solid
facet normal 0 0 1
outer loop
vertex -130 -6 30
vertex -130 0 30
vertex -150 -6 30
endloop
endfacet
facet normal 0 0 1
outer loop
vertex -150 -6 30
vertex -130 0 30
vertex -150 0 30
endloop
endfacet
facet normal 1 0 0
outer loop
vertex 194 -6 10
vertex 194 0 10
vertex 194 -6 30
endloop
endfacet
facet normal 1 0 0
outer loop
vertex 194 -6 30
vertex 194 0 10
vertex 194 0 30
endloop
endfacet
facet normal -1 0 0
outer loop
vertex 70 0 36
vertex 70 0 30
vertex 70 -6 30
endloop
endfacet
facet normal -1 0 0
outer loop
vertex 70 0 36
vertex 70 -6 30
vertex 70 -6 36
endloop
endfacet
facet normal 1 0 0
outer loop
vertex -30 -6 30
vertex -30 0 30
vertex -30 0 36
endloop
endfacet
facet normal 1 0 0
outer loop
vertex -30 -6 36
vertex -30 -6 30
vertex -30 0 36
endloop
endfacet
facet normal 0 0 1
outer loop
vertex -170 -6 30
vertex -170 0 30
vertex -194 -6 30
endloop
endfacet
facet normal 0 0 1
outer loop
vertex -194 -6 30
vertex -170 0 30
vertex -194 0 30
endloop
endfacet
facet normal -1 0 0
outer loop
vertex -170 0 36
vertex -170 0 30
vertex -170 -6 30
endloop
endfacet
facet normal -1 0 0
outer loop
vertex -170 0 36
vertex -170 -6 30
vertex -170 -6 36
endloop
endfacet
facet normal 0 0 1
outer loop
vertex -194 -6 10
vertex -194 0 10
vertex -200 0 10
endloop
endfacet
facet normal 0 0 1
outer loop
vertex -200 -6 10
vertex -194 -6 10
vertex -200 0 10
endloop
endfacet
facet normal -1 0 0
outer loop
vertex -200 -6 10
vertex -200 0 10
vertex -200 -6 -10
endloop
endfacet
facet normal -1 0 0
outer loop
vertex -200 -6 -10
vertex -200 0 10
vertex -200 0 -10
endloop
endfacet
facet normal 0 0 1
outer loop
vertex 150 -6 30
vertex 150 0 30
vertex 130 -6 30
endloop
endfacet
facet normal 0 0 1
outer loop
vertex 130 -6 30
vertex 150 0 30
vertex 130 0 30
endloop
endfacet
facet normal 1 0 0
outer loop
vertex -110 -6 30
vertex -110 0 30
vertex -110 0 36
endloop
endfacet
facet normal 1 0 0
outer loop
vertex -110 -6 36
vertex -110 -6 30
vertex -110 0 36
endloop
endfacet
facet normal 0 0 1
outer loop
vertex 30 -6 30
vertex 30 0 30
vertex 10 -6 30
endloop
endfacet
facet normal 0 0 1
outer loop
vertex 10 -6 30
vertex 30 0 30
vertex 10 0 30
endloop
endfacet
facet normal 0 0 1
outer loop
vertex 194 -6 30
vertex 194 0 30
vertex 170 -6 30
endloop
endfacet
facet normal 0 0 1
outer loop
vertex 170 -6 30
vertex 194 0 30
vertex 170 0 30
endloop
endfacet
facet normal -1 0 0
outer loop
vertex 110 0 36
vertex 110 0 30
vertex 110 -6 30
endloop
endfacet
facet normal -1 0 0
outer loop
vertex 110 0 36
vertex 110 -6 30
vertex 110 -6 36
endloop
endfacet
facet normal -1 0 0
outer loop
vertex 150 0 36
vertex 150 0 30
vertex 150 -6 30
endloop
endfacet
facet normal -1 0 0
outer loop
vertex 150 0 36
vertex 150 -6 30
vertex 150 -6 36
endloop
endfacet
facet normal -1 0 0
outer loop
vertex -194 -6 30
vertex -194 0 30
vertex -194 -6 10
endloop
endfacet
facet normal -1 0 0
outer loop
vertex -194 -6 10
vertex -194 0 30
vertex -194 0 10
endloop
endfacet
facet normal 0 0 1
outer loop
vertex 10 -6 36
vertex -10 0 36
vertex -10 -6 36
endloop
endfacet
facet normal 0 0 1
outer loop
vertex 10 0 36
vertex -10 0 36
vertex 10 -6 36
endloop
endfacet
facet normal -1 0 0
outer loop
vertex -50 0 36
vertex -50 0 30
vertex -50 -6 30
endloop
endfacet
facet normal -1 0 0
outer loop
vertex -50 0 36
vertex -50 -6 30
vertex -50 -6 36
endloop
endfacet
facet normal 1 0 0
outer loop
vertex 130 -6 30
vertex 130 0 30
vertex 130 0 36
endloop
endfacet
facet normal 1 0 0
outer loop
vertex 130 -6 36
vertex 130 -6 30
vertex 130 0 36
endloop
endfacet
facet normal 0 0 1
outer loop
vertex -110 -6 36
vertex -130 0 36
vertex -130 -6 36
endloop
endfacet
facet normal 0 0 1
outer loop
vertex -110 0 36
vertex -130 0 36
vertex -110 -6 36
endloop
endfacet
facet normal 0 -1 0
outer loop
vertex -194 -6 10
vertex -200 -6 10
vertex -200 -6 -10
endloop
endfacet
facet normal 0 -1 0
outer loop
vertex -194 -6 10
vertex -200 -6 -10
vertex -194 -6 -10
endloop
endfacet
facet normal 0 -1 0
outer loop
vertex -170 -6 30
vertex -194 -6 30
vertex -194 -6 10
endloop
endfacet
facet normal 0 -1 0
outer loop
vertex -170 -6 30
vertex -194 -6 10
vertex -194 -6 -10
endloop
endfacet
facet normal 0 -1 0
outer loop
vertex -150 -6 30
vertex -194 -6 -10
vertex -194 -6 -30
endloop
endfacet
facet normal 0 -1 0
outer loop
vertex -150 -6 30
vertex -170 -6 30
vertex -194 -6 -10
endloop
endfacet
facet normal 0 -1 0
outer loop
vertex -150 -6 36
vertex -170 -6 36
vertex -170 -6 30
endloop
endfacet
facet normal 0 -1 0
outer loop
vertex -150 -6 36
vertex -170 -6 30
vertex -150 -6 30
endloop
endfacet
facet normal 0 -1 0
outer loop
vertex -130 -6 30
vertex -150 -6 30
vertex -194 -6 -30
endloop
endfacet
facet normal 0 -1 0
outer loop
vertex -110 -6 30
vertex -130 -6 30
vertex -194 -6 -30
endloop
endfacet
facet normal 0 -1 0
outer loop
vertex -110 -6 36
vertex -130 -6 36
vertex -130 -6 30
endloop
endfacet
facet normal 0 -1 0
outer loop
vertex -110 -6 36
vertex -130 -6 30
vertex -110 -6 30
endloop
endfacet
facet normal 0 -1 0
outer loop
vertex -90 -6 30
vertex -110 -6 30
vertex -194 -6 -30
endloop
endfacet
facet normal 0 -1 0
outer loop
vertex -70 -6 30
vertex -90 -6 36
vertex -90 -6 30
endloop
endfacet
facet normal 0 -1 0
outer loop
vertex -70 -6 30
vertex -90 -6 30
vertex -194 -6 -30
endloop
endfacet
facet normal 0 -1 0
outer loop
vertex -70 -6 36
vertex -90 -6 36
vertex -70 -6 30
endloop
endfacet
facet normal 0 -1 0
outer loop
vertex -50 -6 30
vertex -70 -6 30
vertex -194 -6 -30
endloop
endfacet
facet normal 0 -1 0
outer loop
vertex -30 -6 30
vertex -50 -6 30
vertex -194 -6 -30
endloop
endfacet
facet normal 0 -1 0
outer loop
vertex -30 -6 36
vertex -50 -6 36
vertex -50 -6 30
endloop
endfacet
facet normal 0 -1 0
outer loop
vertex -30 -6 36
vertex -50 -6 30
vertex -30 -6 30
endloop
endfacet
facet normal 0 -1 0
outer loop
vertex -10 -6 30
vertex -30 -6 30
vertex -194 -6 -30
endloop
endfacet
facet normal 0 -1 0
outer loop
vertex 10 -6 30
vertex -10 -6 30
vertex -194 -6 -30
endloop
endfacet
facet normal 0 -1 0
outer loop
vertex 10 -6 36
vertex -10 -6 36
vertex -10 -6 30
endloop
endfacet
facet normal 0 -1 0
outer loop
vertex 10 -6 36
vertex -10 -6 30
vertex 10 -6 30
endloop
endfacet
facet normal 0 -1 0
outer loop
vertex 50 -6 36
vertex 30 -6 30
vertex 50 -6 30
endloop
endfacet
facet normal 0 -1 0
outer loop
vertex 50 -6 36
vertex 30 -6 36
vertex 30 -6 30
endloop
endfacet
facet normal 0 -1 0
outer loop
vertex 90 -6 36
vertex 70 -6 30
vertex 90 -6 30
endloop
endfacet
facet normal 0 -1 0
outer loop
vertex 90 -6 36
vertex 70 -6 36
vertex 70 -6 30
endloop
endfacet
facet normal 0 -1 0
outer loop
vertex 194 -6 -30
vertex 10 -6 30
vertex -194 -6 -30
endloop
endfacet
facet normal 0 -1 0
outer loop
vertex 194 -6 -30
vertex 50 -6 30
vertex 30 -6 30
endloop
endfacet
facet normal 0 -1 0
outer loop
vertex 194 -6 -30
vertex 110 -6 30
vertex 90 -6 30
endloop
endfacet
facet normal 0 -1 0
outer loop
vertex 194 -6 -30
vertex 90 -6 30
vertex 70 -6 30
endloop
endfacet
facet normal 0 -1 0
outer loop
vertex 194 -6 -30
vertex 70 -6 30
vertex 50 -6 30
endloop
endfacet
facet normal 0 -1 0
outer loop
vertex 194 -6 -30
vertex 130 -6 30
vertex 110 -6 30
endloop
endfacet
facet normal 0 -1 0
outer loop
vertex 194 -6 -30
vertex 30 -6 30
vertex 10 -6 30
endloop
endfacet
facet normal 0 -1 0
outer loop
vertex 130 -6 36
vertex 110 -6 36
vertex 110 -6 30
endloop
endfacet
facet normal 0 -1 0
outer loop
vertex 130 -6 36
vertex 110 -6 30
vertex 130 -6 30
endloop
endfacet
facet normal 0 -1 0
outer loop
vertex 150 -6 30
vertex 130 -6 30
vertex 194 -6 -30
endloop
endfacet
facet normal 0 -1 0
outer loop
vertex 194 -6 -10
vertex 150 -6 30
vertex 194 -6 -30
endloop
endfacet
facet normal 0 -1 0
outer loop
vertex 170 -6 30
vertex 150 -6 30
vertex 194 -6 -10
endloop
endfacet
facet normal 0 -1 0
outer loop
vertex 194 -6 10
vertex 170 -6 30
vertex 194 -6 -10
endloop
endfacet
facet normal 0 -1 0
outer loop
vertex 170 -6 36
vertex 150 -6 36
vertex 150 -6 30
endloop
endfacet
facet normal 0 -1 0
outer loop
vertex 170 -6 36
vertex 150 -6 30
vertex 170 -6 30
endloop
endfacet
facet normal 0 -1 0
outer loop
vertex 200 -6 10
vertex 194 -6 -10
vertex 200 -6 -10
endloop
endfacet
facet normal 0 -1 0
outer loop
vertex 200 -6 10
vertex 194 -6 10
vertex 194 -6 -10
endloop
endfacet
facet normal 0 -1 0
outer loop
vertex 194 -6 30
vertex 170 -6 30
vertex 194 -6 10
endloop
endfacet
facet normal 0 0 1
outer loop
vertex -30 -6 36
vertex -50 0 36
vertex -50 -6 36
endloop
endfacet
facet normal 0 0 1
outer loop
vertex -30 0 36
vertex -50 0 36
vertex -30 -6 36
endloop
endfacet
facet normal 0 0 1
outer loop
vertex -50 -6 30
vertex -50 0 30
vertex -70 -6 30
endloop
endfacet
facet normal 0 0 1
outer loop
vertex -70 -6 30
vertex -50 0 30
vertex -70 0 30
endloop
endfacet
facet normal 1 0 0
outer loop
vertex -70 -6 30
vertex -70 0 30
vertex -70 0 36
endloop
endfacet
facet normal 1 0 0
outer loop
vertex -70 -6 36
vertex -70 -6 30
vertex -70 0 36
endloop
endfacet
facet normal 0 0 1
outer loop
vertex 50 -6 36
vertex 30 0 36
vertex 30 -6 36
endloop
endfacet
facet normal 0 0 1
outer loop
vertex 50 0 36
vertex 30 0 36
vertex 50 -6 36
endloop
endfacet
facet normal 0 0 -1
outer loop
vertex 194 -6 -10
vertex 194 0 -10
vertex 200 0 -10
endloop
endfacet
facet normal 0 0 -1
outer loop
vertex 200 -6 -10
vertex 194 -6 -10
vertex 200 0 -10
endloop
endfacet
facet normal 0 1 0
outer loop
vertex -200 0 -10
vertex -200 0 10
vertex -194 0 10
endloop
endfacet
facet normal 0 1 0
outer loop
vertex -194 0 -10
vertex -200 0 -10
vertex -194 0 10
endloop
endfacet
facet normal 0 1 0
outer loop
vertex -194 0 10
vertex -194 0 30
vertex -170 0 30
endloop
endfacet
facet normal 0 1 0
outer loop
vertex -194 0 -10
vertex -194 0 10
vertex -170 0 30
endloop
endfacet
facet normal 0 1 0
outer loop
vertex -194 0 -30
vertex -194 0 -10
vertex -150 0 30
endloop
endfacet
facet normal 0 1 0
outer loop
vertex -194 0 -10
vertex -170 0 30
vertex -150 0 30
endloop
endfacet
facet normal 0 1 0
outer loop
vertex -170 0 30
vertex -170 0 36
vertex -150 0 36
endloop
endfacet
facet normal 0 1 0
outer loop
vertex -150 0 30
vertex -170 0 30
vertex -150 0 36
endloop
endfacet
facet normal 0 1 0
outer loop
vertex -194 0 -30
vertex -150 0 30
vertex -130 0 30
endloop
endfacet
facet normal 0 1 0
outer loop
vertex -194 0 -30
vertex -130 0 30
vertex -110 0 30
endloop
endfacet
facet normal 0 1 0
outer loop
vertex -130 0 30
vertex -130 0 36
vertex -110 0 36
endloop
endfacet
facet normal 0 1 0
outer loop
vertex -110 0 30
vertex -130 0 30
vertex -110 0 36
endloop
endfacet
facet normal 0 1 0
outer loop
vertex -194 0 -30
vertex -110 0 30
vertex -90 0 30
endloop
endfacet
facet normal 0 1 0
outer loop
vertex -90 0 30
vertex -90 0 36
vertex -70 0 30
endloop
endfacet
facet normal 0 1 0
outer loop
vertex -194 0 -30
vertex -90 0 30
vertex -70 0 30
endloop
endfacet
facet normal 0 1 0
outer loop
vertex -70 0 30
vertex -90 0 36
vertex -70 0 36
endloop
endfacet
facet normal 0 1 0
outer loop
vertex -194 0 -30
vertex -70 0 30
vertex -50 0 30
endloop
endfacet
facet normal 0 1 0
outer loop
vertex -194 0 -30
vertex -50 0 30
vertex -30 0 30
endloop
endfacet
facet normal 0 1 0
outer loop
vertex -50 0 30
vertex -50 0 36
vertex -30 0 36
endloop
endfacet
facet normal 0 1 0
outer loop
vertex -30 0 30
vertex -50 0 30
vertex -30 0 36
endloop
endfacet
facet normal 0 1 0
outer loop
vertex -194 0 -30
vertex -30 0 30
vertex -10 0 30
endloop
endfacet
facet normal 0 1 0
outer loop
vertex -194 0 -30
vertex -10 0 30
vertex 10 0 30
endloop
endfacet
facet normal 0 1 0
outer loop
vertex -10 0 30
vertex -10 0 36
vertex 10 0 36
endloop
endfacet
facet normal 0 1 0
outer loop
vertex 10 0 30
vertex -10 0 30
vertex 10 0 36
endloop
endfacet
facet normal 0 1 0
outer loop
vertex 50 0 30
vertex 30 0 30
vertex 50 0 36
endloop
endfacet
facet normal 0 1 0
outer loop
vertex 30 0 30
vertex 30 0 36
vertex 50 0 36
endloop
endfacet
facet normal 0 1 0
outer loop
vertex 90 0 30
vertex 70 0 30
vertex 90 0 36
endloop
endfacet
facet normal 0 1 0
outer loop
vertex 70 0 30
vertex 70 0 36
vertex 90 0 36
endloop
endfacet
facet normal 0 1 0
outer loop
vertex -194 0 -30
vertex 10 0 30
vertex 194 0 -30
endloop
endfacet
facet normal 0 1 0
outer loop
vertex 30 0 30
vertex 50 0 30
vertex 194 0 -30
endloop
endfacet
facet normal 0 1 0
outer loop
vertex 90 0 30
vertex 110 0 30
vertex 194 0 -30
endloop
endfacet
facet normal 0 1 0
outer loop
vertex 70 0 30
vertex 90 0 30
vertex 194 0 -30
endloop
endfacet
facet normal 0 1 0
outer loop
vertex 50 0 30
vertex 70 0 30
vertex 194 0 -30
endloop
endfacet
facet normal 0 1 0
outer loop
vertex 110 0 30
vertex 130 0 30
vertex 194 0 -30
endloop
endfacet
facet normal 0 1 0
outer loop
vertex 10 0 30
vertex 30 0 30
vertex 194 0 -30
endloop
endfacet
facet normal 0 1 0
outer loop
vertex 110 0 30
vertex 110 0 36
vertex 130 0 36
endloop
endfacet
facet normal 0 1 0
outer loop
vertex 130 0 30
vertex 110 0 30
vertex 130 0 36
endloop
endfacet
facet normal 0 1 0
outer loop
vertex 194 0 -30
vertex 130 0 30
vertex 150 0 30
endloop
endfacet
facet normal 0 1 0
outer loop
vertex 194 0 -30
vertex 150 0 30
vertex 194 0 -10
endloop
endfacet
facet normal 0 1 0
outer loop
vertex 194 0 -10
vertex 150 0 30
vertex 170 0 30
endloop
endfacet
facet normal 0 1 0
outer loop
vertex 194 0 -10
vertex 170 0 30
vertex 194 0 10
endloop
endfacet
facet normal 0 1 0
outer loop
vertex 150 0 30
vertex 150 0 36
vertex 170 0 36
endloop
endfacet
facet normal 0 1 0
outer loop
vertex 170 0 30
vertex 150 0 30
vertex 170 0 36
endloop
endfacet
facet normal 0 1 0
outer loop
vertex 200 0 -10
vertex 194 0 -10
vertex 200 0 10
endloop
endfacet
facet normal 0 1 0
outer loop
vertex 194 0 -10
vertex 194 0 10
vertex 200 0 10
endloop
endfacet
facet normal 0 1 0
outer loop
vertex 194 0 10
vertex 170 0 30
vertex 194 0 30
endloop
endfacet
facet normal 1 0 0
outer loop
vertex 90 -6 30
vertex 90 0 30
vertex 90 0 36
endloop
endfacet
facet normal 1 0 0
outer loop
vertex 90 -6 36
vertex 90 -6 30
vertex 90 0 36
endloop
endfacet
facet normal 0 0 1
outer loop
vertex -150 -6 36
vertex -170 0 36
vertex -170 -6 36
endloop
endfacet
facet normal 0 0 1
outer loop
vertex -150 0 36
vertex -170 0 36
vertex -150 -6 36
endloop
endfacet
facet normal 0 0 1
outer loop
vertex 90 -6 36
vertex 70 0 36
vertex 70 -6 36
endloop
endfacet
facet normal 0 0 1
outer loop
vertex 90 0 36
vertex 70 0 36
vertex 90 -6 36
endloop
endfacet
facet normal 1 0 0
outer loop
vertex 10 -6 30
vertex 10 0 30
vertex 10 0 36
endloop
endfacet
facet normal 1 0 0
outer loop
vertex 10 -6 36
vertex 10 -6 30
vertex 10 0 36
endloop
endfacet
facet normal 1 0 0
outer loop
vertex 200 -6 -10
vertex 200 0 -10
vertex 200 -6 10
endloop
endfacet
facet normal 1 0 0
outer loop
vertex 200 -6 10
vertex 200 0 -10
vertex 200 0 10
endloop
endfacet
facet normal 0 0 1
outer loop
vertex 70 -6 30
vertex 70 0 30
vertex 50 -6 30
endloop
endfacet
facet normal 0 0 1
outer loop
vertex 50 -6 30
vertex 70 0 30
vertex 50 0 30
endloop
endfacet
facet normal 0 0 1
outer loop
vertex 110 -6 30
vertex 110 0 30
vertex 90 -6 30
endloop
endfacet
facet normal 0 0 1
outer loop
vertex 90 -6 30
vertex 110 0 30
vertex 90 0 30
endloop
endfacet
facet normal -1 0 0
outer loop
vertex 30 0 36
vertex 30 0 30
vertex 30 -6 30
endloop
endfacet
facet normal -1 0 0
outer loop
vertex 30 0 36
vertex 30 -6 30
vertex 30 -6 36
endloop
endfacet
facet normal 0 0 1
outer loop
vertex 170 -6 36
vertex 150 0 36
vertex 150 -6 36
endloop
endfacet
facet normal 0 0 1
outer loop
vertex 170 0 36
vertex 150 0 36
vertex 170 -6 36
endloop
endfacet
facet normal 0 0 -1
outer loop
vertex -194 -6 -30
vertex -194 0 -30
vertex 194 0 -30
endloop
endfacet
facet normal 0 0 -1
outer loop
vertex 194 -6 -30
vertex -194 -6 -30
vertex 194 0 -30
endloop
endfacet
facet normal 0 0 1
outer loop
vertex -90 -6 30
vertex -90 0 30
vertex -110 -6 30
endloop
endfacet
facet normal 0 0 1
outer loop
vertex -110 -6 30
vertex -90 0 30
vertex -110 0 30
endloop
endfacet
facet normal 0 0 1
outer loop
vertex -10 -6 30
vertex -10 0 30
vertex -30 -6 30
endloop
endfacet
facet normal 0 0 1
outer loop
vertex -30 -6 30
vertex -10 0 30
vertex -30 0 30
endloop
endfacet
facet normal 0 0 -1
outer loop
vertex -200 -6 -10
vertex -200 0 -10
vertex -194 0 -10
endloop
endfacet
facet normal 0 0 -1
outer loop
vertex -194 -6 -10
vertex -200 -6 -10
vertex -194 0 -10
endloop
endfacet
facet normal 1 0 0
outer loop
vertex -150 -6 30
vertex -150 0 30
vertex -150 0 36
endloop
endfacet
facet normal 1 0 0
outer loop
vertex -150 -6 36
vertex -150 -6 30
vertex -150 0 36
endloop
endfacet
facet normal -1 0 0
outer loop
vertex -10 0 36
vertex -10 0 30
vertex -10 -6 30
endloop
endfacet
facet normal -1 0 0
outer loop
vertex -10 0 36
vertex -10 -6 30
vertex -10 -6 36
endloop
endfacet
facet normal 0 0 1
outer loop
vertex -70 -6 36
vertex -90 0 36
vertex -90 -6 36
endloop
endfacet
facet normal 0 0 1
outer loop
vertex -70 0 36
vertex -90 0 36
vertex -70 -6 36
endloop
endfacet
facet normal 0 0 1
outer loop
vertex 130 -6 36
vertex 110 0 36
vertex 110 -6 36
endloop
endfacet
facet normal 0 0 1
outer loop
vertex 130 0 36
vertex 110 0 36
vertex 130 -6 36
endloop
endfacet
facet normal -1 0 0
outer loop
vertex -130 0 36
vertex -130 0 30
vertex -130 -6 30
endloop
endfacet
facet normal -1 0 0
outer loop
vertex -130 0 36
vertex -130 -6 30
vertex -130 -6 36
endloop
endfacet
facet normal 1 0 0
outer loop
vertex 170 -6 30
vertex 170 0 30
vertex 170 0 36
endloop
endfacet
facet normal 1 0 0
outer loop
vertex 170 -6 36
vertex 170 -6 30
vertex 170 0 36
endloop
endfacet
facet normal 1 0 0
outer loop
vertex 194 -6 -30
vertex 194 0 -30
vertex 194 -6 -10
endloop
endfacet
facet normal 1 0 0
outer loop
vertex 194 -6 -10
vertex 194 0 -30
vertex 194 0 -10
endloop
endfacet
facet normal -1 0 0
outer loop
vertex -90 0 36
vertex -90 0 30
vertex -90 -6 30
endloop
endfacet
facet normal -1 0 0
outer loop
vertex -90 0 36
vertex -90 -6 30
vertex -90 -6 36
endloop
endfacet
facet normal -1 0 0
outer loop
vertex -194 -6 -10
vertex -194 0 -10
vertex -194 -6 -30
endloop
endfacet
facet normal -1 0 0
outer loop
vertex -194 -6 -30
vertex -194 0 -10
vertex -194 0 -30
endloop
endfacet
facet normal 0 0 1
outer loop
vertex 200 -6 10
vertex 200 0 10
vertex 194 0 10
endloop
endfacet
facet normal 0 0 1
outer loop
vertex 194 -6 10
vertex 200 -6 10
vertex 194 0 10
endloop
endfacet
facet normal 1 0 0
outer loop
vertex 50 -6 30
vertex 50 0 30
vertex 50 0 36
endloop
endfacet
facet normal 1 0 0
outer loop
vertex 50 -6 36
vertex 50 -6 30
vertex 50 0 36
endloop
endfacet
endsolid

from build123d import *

# Parameters (mm, degrees)
F0_W     = 20
F0_H     = 6
F1_DEPTH = 6


with BuildPart() as f1:
    # F0 (on Front) → F1 (new body)
    with BuildSketch(Plane.XZ):
        Polygon((-194, -30), (194, -30), (194, -10), (200, -10), (200, 10), (194, 10), (194, 30), (170, 30), (150, 30), (130, 30), (110, 30), (90, 30), (70, 30), (50, 30), (30, 30), (10, 30), (-10, 30), (-30, 30), (-50, 30), (-70, 30), (-90, 30), (-110, 30), (-130, 30), (-150, 30), (-170, 30), (-194, 30), (-194, 10), (-200, 10), (-200, -10), (-194, -10), align=None)
        with Locations((-160, 33)):
            Rectangle(F0_W, F0_H)
        with Locations((-120, 33)):
            Rectangle(F0_W, F0_H)
        with Locations((-80, 33)):
            Rectangle(F0_W, F0_H)
        with Locations((-40, 33)):
            Rectangle(F0_W, F0_H)
        with Locations((0, 33)):
            Rectangle(F0_W, F0_H)
        with Locations((40, 33)):
            Rectangle(F0_W, F0_H)
        with Locations((80, 33)):
            Rectangle(F0_W, F0_H)
        with Locations((120, 33)):
            Rectangle(F0_W, F0_H)
        with Locations((160, 33)):
            Rectangle(F0_W, F0_H)
    extrude(amount=F1_DEPTH)


solid = f1.part
